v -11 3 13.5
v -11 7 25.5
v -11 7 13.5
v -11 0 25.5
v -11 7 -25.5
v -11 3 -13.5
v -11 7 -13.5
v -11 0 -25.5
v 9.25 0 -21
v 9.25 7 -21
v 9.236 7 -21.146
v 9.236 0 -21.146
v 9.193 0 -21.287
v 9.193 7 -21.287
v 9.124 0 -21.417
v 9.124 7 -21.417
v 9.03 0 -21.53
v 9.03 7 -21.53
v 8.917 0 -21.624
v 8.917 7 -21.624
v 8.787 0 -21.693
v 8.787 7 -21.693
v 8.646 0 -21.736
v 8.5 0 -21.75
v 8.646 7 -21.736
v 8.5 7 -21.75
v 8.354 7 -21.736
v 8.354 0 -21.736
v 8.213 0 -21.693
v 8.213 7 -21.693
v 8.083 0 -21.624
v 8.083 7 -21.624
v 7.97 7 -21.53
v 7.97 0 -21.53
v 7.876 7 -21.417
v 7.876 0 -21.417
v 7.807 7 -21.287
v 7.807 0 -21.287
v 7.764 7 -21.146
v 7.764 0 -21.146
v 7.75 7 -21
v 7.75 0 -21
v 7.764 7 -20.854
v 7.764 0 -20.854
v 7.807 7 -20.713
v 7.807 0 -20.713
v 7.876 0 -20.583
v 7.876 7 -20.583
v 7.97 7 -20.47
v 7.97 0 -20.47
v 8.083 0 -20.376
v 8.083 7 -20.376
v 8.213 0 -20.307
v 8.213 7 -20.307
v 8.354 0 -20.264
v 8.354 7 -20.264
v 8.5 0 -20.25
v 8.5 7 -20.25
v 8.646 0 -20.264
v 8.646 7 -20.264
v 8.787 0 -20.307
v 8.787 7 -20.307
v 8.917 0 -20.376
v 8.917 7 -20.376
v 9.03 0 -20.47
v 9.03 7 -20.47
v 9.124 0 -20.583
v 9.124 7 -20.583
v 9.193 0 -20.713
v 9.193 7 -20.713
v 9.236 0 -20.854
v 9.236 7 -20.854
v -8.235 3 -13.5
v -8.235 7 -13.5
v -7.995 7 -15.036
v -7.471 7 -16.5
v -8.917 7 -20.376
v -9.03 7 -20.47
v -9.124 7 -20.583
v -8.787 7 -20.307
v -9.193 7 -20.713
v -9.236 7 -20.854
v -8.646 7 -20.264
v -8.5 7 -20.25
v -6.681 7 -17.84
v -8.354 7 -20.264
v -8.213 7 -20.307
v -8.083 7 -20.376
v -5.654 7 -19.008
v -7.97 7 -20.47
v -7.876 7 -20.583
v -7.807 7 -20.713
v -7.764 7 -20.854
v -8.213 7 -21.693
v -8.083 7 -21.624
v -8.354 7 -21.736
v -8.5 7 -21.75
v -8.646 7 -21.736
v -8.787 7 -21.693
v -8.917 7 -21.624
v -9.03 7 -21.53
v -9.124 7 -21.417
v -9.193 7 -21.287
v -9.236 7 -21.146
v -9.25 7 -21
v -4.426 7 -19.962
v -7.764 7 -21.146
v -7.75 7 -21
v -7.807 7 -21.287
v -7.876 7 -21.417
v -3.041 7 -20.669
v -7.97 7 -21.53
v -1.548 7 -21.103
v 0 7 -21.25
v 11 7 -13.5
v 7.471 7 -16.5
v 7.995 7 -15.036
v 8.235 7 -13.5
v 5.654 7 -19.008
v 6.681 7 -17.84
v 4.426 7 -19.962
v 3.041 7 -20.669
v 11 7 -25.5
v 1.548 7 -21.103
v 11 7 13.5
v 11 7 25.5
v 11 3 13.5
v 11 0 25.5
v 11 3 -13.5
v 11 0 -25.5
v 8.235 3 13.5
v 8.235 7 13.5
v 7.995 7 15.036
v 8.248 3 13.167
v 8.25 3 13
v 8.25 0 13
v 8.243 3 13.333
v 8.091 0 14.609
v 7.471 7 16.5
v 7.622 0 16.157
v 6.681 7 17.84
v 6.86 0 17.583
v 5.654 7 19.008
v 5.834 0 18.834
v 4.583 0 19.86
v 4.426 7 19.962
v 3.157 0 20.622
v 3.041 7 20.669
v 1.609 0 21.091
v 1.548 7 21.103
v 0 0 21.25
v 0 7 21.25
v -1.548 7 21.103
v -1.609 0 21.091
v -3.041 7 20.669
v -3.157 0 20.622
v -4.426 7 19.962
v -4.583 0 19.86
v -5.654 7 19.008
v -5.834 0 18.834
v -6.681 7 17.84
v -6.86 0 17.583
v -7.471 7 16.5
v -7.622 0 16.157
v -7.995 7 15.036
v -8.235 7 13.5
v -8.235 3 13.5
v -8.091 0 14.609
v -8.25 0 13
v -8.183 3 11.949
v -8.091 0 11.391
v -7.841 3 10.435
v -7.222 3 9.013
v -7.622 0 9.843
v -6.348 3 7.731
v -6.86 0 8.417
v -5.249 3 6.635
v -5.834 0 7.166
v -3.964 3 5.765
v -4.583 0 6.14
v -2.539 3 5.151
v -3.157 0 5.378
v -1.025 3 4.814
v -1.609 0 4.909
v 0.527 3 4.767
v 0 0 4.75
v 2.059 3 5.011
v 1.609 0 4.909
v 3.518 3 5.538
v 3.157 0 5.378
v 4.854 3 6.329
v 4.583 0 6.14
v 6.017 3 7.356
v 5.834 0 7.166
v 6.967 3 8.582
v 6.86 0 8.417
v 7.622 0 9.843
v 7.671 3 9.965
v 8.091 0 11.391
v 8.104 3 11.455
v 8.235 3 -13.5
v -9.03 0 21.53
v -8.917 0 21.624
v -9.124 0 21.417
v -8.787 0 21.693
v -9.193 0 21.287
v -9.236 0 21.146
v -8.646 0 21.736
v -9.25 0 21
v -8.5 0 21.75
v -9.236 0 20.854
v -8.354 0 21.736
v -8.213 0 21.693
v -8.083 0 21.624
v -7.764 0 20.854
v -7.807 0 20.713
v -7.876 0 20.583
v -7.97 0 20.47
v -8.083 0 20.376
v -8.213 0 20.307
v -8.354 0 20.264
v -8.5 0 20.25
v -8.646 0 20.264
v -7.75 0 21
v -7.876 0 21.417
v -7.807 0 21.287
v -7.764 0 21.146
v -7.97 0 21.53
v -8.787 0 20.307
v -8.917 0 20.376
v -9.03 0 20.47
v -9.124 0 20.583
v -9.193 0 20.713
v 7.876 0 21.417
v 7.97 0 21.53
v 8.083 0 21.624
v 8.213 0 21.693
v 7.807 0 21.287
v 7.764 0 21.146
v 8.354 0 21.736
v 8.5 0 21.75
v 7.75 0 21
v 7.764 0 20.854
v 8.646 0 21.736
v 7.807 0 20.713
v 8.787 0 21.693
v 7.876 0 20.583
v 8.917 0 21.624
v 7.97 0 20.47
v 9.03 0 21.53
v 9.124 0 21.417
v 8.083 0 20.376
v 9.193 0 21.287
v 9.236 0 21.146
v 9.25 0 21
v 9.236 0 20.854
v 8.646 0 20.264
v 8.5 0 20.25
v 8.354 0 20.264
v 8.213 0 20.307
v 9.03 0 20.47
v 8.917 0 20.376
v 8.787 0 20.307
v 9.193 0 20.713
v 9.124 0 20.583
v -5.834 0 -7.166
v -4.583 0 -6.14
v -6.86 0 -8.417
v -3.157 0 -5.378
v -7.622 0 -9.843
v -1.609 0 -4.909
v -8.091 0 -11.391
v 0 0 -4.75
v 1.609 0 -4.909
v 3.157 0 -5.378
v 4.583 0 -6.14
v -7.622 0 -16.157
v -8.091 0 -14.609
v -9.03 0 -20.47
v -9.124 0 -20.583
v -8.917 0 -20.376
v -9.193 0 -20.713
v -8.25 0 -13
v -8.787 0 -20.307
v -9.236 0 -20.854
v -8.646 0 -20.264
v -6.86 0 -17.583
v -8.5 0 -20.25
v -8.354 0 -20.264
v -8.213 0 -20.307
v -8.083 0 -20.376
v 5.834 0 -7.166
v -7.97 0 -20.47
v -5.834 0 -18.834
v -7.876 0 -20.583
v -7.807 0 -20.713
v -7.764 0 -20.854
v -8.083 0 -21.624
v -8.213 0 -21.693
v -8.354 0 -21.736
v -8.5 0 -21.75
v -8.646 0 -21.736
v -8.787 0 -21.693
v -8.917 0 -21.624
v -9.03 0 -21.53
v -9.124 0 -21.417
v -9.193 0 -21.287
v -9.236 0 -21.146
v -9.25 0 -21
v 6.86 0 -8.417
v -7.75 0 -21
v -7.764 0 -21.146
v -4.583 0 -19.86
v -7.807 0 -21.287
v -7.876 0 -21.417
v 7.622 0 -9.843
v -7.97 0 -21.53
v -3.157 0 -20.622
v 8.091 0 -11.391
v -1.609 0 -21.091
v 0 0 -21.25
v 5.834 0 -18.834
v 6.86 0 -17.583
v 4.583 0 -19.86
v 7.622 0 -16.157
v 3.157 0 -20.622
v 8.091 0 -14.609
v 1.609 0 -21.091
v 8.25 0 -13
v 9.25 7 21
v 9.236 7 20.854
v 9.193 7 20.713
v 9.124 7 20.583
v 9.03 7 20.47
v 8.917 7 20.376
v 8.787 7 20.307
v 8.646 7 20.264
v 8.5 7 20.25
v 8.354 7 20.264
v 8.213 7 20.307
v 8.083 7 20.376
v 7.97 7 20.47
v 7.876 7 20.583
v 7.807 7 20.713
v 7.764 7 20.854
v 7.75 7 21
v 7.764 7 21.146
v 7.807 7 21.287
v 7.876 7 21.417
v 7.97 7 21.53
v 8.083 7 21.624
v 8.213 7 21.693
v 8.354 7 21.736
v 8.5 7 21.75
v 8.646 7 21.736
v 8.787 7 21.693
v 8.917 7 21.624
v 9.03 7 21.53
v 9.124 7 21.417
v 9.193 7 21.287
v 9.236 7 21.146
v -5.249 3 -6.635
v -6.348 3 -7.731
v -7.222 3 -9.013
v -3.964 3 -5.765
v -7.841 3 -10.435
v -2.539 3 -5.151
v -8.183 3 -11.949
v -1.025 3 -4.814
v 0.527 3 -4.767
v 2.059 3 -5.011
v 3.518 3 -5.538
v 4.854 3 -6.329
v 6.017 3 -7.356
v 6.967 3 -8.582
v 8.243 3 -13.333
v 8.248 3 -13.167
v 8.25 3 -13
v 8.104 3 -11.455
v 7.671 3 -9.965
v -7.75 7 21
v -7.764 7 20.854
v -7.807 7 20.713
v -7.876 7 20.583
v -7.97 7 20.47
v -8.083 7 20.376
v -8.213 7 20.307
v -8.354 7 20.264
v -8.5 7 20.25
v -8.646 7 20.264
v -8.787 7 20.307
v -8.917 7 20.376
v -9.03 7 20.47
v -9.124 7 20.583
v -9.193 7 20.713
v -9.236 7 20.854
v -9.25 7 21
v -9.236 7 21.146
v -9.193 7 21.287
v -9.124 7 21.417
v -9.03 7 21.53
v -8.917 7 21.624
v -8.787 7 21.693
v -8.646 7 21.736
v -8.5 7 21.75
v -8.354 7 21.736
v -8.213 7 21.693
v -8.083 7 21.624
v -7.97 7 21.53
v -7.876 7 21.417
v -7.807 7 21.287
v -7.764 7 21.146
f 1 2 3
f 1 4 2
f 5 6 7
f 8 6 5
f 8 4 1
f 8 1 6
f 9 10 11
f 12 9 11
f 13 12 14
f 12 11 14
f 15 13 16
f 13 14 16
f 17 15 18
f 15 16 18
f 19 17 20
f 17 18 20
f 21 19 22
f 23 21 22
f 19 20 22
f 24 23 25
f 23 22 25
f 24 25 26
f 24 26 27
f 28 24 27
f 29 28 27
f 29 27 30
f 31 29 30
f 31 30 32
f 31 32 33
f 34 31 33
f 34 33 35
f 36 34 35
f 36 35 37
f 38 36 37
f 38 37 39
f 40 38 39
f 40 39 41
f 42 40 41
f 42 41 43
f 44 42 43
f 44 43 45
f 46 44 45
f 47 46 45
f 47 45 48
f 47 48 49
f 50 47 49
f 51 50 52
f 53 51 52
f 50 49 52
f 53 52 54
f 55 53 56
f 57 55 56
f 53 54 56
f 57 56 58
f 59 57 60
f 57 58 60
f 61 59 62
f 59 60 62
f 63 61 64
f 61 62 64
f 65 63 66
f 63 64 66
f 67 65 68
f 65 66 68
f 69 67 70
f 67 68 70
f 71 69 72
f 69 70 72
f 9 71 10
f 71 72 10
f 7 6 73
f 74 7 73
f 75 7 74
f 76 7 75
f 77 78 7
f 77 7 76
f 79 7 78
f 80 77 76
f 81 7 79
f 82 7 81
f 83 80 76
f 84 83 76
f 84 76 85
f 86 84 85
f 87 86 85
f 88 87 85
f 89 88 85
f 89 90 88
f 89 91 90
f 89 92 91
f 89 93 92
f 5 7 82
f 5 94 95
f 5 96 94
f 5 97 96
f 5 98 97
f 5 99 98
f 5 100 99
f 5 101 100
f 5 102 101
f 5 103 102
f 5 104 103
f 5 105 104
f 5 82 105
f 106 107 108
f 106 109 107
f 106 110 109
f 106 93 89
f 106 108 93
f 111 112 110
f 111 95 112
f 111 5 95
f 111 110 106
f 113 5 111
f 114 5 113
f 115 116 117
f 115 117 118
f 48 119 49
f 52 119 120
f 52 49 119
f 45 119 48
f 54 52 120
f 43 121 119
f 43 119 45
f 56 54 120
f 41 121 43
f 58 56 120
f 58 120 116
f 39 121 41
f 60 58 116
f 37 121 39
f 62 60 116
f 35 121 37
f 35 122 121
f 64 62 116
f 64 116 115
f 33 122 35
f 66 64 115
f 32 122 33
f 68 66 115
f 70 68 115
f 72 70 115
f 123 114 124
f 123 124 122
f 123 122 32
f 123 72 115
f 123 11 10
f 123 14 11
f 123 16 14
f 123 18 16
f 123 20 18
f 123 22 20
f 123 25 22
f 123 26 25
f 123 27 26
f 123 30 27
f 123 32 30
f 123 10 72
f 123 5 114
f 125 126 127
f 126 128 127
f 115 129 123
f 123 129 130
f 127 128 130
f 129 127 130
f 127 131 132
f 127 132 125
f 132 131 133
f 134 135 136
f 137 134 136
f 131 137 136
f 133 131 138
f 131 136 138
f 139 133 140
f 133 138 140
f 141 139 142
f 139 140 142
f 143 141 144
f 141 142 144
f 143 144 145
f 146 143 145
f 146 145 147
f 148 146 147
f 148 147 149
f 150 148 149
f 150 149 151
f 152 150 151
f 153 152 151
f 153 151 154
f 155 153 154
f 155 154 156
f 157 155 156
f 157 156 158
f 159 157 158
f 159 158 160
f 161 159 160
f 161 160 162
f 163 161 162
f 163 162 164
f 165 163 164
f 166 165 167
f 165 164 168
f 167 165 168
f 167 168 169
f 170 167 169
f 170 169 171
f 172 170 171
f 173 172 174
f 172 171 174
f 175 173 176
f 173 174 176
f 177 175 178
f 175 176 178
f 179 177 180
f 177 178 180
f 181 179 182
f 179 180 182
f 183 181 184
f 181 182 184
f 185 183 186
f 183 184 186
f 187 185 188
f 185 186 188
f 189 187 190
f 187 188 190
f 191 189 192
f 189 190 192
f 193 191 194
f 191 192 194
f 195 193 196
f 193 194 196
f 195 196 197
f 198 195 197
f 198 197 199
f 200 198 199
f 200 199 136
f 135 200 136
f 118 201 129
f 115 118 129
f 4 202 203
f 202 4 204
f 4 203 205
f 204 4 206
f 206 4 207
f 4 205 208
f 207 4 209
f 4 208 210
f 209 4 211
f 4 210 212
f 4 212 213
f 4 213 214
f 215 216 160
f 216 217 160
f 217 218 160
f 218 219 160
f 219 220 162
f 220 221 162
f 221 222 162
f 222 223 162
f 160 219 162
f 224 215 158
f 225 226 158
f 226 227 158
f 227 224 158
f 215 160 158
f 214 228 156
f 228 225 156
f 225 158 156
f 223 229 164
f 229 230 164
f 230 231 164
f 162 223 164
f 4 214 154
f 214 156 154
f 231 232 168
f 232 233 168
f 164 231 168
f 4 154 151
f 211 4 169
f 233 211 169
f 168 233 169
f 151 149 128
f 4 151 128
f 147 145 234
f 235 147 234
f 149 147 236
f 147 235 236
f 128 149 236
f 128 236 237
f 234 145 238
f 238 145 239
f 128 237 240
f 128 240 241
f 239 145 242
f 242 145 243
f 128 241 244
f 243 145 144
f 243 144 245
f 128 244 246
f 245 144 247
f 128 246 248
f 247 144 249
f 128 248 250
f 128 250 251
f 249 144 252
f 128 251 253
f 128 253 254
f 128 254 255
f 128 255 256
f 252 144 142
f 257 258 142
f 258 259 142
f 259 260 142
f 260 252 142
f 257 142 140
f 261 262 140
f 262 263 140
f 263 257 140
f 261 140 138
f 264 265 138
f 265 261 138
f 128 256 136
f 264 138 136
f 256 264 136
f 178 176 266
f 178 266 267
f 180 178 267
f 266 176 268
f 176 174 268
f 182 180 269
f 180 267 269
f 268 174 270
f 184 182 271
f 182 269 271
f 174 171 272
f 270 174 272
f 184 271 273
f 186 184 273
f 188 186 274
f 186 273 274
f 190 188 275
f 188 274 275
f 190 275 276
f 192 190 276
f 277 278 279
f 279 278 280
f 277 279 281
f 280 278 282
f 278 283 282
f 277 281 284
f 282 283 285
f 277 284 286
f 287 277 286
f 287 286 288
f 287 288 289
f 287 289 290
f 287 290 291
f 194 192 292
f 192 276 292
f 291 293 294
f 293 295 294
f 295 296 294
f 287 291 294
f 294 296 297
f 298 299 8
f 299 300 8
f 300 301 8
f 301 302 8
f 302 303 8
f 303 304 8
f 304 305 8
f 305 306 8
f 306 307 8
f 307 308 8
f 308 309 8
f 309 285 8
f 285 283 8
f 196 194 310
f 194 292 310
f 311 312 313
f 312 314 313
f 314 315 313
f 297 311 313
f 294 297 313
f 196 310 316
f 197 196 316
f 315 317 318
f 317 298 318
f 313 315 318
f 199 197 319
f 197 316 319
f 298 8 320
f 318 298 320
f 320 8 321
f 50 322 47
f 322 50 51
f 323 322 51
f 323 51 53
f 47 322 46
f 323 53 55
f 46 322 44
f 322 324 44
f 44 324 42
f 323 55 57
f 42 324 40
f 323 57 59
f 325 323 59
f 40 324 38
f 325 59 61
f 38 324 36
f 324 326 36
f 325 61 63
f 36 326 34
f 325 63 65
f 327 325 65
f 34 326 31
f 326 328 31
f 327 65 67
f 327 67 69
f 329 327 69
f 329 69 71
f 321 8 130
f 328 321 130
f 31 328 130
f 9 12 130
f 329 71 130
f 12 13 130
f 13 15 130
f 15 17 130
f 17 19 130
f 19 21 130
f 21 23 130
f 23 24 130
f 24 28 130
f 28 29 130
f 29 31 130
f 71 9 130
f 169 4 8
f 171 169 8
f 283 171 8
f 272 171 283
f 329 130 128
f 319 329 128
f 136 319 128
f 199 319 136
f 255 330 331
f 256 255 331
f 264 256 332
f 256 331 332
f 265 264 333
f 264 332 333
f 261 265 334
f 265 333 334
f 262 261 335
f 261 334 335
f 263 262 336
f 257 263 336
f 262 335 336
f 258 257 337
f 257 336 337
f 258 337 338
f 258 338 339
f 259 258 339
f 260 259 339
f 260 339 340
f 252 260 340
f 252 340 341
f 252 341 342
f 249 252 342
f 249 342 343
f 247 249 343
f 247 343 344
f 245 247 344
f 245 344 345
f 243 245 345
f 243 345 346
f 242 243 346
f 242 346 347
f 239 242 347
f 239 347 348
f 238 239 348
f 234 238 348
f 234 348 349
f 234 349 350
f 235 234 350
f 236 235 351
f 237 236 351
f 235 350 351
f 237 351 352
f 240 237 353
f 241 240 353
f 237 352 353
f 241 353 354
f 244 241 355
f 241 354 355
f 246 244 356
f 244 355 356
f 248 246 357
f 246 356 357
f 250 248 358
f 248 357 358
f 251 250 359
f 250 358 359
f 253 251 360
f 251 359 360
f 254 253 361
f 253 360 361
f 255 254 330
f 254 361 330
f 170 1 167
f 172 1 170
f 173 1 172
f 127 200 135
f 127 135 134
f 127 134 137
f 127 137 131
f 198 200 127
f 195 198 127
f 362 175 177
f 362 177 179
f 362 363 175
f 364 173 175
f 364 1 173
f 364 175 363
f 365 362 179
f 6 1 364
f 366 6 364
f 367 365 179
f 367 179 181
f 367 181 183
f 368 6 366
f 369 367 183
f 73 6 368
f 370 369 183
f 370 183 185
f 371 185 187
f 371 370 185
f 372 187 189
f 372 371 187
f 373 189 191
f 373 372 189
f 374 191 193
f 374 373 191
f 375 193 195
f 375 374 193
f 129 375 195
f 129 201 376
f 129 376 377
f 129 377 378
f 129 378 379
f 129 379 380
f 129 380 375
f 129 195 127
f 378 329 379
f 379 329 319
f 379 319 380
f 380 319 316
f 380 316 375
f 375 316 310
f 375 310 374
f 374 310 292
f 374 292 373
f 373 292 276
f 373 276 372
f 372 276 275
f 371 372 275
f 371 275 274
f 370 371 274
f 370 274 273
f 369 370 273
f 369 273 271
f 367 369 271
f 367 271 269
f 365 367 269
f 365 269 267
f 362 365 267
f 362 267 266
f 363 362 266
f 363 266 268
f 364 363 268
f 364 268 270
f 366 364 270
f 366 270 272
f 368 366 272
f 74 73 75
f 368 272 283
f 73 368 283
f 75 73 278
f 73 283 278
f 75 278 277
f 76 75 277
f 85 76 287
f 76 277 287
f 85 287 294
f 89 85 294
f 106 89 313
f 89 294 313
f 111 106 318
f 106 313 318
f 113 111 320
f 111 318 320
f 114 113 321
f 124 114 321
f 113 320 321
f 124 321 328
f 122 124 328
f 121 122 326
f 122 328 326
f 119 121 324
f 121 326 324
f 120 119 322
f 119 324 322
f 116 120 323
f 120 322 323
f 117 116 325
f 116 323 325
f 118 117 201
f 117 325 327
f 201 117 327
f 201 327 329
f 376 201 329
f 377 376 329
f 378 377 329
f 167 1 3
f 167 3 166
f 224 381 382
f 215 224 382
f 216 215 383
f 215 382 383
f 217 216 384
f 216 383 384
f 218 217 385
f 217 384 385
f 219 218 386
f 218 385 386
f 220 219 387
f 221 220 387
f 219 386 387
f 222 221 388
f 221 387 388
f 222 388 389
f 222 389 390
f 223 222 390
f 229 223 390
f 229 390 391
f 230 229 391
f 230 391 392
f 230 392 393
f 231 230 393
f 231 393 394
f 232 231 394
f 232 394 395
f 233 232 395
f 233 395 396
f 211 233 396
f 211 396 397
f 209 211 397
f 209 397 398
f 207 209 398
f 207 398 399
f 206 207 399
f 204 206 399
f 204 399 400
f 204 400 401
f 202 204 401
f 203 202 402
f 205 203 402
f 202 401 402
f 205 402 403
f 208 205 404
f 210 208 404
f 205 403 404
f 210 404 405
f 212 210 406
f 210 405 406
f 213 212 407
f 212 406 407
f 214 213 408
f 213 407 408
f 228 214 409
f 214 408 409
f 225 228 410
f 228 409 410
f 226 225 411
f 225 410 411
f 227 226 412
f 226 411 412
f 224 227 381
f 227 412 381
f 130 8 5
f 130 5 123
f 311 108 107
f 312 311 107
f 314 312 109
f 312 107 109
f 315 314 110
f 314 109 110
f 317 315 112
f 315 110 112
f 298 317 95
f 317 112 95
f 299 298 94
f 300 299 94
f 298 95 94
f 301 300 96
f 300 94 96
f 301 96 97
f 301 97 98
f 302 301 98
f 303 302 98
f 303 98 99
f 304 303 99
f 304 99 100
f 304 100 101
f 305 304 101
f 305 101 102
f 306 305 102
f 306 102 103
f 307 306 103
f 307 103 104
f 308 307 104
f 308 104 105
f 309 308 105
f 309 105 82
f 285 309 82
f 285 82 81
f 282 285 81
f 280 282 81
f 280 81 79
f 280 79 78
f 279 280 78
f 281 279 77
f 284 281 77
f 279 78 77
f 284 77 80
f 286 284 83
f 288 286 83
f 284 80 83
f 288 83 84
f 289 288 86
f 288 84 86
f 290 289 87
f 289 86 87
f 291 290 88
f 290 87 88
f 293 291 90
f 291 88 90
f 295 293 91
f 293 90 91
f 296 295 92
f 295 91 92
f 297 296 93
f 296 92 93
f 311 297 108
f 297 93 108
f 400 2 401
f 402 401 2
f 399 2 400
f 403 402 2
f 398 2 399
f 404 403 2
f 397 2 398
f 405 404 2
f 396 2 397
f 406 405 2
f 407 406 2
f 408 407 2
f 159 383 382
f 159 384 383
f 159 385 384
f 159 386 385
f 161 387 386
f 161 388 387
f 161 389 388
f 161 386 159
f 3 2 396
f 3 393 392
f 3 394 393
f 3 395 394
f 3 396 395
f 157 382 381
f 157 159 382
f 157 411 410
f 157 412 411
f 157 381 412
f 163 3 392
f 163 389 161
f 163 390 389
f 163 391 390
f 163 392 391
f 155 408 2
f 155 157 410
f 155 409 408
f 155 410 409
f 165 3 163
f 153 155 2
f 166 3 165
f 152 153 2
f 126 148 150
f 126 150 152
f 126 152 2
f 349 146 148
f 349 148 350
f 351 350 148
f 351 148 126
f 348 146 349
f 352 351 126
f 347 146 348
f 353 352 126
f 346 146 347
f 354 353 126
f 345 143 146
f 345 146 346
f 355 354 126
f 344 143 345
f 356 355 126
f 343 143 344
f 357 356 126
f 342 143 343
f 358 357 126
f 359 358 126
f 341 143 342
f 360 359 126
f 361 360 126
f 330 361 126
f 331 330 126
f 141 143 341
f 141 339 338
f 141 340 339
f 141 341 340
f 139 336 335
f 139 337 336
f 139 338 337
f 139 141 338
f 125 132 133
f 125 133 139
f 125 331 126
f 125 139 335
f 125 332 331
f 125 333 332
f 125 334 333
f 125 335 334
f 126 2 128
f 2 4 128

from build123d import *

# Parameters (mm, degrees)
SKETCH_1_W             = 22
SKETCH_1_H             = 51
EXTRUDE_410_DEPTH      = 3
SKETCH_2_W             = 22
SKETCH_2_H             = 12
EXTRUDE_754_DEPTH      = 4
SKETCH_3_R             = 8.25
CUT_EXTRUDE_970_DEPTH  = 8
SKETCH_4_R             = 0.75
CUT_EXTRUDE_1248_DEPTH = 8


with BuildPart() as part:
    # 草图1 → Extrude 410 (new body)
    with BuildSketch(Plane(origin=(0, 0, 0), x_dir=(1, 0, 0), z_dir=(0, 1, 0))):
        Rectangle(SKETCH_1_W, SKETCH_1_H)
    extrude(amount=EXTRUDE_410_DEPTH)

    # 草图2 → Extrude 754 (add)
    with BuildSketch(Plane(origin=(0, 3, 0), x_dir=(1, 0, 0), z_dir=(0, 1, 0))):
        with Locations((0, -19.5)):
            Rectangle(SKETCH_2_W, SKETCH_2_H)
        with Locations((0, 19.5)):
            Rectangle(SKETCH_2_W, SKETCH_2_H)
    extrude(amount=EXTRUDE_754_DEPTH)

    # 草图3 → Cut-Extrude 970 (cut, through all)
    with BuildSketch(Plane.XZ):
        with Locations((0, 13)):
            Circle(SKETCH_3_R)
        with Locations((0, -13)):
            Circle(SKETCH_3_R)
    extrude(amount=-CUT_EXTRUDE_970_DEPTH, mode=Mode.SUBTRACT)

    # 草图4 → Cut-Extrude 1248 (cut, through all)
    with BuildSketch(Plane(origin=(0, 7, 0), x_dir=(1, 0, 0), z_dir=(0, 1, 0))):
        with Locations((-8.5, -21)):
            Circle(SKETCH_4_R)
        with Locations((8.5, -21)):
            Circle(SKETCH_4_R)
        with Locations((8.5, 21)):
            Circle(SKETCH_4_R)
        with Locations((-8.5, 21)):
            Circle(SKETCH_4_R)
    extrude(amount=-CUT_EXTRUDE_1248_DEPTH, mode=Mode.SUBTRACT)


solid = part.part
